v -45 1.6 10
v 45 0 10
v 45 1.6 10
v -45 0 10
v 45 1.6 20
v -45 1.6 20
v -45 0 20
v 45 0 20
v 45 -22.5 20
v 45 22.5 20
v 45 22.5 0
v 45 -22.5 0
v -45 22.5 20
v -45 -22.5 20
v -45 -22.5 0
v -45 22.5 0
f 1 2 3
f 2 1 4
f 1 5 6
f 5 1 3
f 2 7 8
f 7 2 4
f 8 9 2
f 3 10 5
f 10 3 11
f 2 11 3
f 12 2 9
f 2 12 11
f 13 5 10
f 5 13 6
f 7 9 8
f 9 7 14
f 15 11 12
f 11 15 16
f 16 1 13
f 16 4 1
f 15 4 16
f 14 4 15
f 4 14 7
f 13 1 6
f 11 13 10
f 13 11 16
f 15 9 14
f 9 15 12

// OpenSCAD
// Microscope slide drying rack
// Print orientation: base block on XY plane, slots open upward (+Z)

// ---------------- Parameters ----------------
block_len    = 90;    // base block length along X (mm)
block_wid    = 45;    // base block width along Y (mm)
block_ht     = 20;    // base block height along Z (mm)

slot_count   = 10;    // number of microscope slide slots
slot_len     = 77;    // slot length along X (mm)
slot_w       = 1.6;   // slot width along Y (mm)
slot_depth   = 10;    // slot depth into block from top face (mm)
slot_pitch   = 3.5;   // centre-to-centre slot spacing along Y (mm)

eps          = 0.5;   // overshoot so cutters pass cleanly through the top face (mm)

$fn = 64;

// ---------------- Model ----------------
difference() {
    // Solid base block, centred in X and Y, sitting on z = 0
    translate([-block_len / 2, -block_wid / 2, 0])
        cube([block_len, block_wid, block_ht]);

    // Parallel slots running along X, centred as a group in X and Y
    for (i = [0 : slot_count - 1]) {
        x = (i - (slot_count - 1) / 2) * slot_pitch;
        translate([x - slot_len / 2, 0, block_ht - slot_depth])
            cube([slot_len, slot_w, slot_depth + eps]);
    }
}
